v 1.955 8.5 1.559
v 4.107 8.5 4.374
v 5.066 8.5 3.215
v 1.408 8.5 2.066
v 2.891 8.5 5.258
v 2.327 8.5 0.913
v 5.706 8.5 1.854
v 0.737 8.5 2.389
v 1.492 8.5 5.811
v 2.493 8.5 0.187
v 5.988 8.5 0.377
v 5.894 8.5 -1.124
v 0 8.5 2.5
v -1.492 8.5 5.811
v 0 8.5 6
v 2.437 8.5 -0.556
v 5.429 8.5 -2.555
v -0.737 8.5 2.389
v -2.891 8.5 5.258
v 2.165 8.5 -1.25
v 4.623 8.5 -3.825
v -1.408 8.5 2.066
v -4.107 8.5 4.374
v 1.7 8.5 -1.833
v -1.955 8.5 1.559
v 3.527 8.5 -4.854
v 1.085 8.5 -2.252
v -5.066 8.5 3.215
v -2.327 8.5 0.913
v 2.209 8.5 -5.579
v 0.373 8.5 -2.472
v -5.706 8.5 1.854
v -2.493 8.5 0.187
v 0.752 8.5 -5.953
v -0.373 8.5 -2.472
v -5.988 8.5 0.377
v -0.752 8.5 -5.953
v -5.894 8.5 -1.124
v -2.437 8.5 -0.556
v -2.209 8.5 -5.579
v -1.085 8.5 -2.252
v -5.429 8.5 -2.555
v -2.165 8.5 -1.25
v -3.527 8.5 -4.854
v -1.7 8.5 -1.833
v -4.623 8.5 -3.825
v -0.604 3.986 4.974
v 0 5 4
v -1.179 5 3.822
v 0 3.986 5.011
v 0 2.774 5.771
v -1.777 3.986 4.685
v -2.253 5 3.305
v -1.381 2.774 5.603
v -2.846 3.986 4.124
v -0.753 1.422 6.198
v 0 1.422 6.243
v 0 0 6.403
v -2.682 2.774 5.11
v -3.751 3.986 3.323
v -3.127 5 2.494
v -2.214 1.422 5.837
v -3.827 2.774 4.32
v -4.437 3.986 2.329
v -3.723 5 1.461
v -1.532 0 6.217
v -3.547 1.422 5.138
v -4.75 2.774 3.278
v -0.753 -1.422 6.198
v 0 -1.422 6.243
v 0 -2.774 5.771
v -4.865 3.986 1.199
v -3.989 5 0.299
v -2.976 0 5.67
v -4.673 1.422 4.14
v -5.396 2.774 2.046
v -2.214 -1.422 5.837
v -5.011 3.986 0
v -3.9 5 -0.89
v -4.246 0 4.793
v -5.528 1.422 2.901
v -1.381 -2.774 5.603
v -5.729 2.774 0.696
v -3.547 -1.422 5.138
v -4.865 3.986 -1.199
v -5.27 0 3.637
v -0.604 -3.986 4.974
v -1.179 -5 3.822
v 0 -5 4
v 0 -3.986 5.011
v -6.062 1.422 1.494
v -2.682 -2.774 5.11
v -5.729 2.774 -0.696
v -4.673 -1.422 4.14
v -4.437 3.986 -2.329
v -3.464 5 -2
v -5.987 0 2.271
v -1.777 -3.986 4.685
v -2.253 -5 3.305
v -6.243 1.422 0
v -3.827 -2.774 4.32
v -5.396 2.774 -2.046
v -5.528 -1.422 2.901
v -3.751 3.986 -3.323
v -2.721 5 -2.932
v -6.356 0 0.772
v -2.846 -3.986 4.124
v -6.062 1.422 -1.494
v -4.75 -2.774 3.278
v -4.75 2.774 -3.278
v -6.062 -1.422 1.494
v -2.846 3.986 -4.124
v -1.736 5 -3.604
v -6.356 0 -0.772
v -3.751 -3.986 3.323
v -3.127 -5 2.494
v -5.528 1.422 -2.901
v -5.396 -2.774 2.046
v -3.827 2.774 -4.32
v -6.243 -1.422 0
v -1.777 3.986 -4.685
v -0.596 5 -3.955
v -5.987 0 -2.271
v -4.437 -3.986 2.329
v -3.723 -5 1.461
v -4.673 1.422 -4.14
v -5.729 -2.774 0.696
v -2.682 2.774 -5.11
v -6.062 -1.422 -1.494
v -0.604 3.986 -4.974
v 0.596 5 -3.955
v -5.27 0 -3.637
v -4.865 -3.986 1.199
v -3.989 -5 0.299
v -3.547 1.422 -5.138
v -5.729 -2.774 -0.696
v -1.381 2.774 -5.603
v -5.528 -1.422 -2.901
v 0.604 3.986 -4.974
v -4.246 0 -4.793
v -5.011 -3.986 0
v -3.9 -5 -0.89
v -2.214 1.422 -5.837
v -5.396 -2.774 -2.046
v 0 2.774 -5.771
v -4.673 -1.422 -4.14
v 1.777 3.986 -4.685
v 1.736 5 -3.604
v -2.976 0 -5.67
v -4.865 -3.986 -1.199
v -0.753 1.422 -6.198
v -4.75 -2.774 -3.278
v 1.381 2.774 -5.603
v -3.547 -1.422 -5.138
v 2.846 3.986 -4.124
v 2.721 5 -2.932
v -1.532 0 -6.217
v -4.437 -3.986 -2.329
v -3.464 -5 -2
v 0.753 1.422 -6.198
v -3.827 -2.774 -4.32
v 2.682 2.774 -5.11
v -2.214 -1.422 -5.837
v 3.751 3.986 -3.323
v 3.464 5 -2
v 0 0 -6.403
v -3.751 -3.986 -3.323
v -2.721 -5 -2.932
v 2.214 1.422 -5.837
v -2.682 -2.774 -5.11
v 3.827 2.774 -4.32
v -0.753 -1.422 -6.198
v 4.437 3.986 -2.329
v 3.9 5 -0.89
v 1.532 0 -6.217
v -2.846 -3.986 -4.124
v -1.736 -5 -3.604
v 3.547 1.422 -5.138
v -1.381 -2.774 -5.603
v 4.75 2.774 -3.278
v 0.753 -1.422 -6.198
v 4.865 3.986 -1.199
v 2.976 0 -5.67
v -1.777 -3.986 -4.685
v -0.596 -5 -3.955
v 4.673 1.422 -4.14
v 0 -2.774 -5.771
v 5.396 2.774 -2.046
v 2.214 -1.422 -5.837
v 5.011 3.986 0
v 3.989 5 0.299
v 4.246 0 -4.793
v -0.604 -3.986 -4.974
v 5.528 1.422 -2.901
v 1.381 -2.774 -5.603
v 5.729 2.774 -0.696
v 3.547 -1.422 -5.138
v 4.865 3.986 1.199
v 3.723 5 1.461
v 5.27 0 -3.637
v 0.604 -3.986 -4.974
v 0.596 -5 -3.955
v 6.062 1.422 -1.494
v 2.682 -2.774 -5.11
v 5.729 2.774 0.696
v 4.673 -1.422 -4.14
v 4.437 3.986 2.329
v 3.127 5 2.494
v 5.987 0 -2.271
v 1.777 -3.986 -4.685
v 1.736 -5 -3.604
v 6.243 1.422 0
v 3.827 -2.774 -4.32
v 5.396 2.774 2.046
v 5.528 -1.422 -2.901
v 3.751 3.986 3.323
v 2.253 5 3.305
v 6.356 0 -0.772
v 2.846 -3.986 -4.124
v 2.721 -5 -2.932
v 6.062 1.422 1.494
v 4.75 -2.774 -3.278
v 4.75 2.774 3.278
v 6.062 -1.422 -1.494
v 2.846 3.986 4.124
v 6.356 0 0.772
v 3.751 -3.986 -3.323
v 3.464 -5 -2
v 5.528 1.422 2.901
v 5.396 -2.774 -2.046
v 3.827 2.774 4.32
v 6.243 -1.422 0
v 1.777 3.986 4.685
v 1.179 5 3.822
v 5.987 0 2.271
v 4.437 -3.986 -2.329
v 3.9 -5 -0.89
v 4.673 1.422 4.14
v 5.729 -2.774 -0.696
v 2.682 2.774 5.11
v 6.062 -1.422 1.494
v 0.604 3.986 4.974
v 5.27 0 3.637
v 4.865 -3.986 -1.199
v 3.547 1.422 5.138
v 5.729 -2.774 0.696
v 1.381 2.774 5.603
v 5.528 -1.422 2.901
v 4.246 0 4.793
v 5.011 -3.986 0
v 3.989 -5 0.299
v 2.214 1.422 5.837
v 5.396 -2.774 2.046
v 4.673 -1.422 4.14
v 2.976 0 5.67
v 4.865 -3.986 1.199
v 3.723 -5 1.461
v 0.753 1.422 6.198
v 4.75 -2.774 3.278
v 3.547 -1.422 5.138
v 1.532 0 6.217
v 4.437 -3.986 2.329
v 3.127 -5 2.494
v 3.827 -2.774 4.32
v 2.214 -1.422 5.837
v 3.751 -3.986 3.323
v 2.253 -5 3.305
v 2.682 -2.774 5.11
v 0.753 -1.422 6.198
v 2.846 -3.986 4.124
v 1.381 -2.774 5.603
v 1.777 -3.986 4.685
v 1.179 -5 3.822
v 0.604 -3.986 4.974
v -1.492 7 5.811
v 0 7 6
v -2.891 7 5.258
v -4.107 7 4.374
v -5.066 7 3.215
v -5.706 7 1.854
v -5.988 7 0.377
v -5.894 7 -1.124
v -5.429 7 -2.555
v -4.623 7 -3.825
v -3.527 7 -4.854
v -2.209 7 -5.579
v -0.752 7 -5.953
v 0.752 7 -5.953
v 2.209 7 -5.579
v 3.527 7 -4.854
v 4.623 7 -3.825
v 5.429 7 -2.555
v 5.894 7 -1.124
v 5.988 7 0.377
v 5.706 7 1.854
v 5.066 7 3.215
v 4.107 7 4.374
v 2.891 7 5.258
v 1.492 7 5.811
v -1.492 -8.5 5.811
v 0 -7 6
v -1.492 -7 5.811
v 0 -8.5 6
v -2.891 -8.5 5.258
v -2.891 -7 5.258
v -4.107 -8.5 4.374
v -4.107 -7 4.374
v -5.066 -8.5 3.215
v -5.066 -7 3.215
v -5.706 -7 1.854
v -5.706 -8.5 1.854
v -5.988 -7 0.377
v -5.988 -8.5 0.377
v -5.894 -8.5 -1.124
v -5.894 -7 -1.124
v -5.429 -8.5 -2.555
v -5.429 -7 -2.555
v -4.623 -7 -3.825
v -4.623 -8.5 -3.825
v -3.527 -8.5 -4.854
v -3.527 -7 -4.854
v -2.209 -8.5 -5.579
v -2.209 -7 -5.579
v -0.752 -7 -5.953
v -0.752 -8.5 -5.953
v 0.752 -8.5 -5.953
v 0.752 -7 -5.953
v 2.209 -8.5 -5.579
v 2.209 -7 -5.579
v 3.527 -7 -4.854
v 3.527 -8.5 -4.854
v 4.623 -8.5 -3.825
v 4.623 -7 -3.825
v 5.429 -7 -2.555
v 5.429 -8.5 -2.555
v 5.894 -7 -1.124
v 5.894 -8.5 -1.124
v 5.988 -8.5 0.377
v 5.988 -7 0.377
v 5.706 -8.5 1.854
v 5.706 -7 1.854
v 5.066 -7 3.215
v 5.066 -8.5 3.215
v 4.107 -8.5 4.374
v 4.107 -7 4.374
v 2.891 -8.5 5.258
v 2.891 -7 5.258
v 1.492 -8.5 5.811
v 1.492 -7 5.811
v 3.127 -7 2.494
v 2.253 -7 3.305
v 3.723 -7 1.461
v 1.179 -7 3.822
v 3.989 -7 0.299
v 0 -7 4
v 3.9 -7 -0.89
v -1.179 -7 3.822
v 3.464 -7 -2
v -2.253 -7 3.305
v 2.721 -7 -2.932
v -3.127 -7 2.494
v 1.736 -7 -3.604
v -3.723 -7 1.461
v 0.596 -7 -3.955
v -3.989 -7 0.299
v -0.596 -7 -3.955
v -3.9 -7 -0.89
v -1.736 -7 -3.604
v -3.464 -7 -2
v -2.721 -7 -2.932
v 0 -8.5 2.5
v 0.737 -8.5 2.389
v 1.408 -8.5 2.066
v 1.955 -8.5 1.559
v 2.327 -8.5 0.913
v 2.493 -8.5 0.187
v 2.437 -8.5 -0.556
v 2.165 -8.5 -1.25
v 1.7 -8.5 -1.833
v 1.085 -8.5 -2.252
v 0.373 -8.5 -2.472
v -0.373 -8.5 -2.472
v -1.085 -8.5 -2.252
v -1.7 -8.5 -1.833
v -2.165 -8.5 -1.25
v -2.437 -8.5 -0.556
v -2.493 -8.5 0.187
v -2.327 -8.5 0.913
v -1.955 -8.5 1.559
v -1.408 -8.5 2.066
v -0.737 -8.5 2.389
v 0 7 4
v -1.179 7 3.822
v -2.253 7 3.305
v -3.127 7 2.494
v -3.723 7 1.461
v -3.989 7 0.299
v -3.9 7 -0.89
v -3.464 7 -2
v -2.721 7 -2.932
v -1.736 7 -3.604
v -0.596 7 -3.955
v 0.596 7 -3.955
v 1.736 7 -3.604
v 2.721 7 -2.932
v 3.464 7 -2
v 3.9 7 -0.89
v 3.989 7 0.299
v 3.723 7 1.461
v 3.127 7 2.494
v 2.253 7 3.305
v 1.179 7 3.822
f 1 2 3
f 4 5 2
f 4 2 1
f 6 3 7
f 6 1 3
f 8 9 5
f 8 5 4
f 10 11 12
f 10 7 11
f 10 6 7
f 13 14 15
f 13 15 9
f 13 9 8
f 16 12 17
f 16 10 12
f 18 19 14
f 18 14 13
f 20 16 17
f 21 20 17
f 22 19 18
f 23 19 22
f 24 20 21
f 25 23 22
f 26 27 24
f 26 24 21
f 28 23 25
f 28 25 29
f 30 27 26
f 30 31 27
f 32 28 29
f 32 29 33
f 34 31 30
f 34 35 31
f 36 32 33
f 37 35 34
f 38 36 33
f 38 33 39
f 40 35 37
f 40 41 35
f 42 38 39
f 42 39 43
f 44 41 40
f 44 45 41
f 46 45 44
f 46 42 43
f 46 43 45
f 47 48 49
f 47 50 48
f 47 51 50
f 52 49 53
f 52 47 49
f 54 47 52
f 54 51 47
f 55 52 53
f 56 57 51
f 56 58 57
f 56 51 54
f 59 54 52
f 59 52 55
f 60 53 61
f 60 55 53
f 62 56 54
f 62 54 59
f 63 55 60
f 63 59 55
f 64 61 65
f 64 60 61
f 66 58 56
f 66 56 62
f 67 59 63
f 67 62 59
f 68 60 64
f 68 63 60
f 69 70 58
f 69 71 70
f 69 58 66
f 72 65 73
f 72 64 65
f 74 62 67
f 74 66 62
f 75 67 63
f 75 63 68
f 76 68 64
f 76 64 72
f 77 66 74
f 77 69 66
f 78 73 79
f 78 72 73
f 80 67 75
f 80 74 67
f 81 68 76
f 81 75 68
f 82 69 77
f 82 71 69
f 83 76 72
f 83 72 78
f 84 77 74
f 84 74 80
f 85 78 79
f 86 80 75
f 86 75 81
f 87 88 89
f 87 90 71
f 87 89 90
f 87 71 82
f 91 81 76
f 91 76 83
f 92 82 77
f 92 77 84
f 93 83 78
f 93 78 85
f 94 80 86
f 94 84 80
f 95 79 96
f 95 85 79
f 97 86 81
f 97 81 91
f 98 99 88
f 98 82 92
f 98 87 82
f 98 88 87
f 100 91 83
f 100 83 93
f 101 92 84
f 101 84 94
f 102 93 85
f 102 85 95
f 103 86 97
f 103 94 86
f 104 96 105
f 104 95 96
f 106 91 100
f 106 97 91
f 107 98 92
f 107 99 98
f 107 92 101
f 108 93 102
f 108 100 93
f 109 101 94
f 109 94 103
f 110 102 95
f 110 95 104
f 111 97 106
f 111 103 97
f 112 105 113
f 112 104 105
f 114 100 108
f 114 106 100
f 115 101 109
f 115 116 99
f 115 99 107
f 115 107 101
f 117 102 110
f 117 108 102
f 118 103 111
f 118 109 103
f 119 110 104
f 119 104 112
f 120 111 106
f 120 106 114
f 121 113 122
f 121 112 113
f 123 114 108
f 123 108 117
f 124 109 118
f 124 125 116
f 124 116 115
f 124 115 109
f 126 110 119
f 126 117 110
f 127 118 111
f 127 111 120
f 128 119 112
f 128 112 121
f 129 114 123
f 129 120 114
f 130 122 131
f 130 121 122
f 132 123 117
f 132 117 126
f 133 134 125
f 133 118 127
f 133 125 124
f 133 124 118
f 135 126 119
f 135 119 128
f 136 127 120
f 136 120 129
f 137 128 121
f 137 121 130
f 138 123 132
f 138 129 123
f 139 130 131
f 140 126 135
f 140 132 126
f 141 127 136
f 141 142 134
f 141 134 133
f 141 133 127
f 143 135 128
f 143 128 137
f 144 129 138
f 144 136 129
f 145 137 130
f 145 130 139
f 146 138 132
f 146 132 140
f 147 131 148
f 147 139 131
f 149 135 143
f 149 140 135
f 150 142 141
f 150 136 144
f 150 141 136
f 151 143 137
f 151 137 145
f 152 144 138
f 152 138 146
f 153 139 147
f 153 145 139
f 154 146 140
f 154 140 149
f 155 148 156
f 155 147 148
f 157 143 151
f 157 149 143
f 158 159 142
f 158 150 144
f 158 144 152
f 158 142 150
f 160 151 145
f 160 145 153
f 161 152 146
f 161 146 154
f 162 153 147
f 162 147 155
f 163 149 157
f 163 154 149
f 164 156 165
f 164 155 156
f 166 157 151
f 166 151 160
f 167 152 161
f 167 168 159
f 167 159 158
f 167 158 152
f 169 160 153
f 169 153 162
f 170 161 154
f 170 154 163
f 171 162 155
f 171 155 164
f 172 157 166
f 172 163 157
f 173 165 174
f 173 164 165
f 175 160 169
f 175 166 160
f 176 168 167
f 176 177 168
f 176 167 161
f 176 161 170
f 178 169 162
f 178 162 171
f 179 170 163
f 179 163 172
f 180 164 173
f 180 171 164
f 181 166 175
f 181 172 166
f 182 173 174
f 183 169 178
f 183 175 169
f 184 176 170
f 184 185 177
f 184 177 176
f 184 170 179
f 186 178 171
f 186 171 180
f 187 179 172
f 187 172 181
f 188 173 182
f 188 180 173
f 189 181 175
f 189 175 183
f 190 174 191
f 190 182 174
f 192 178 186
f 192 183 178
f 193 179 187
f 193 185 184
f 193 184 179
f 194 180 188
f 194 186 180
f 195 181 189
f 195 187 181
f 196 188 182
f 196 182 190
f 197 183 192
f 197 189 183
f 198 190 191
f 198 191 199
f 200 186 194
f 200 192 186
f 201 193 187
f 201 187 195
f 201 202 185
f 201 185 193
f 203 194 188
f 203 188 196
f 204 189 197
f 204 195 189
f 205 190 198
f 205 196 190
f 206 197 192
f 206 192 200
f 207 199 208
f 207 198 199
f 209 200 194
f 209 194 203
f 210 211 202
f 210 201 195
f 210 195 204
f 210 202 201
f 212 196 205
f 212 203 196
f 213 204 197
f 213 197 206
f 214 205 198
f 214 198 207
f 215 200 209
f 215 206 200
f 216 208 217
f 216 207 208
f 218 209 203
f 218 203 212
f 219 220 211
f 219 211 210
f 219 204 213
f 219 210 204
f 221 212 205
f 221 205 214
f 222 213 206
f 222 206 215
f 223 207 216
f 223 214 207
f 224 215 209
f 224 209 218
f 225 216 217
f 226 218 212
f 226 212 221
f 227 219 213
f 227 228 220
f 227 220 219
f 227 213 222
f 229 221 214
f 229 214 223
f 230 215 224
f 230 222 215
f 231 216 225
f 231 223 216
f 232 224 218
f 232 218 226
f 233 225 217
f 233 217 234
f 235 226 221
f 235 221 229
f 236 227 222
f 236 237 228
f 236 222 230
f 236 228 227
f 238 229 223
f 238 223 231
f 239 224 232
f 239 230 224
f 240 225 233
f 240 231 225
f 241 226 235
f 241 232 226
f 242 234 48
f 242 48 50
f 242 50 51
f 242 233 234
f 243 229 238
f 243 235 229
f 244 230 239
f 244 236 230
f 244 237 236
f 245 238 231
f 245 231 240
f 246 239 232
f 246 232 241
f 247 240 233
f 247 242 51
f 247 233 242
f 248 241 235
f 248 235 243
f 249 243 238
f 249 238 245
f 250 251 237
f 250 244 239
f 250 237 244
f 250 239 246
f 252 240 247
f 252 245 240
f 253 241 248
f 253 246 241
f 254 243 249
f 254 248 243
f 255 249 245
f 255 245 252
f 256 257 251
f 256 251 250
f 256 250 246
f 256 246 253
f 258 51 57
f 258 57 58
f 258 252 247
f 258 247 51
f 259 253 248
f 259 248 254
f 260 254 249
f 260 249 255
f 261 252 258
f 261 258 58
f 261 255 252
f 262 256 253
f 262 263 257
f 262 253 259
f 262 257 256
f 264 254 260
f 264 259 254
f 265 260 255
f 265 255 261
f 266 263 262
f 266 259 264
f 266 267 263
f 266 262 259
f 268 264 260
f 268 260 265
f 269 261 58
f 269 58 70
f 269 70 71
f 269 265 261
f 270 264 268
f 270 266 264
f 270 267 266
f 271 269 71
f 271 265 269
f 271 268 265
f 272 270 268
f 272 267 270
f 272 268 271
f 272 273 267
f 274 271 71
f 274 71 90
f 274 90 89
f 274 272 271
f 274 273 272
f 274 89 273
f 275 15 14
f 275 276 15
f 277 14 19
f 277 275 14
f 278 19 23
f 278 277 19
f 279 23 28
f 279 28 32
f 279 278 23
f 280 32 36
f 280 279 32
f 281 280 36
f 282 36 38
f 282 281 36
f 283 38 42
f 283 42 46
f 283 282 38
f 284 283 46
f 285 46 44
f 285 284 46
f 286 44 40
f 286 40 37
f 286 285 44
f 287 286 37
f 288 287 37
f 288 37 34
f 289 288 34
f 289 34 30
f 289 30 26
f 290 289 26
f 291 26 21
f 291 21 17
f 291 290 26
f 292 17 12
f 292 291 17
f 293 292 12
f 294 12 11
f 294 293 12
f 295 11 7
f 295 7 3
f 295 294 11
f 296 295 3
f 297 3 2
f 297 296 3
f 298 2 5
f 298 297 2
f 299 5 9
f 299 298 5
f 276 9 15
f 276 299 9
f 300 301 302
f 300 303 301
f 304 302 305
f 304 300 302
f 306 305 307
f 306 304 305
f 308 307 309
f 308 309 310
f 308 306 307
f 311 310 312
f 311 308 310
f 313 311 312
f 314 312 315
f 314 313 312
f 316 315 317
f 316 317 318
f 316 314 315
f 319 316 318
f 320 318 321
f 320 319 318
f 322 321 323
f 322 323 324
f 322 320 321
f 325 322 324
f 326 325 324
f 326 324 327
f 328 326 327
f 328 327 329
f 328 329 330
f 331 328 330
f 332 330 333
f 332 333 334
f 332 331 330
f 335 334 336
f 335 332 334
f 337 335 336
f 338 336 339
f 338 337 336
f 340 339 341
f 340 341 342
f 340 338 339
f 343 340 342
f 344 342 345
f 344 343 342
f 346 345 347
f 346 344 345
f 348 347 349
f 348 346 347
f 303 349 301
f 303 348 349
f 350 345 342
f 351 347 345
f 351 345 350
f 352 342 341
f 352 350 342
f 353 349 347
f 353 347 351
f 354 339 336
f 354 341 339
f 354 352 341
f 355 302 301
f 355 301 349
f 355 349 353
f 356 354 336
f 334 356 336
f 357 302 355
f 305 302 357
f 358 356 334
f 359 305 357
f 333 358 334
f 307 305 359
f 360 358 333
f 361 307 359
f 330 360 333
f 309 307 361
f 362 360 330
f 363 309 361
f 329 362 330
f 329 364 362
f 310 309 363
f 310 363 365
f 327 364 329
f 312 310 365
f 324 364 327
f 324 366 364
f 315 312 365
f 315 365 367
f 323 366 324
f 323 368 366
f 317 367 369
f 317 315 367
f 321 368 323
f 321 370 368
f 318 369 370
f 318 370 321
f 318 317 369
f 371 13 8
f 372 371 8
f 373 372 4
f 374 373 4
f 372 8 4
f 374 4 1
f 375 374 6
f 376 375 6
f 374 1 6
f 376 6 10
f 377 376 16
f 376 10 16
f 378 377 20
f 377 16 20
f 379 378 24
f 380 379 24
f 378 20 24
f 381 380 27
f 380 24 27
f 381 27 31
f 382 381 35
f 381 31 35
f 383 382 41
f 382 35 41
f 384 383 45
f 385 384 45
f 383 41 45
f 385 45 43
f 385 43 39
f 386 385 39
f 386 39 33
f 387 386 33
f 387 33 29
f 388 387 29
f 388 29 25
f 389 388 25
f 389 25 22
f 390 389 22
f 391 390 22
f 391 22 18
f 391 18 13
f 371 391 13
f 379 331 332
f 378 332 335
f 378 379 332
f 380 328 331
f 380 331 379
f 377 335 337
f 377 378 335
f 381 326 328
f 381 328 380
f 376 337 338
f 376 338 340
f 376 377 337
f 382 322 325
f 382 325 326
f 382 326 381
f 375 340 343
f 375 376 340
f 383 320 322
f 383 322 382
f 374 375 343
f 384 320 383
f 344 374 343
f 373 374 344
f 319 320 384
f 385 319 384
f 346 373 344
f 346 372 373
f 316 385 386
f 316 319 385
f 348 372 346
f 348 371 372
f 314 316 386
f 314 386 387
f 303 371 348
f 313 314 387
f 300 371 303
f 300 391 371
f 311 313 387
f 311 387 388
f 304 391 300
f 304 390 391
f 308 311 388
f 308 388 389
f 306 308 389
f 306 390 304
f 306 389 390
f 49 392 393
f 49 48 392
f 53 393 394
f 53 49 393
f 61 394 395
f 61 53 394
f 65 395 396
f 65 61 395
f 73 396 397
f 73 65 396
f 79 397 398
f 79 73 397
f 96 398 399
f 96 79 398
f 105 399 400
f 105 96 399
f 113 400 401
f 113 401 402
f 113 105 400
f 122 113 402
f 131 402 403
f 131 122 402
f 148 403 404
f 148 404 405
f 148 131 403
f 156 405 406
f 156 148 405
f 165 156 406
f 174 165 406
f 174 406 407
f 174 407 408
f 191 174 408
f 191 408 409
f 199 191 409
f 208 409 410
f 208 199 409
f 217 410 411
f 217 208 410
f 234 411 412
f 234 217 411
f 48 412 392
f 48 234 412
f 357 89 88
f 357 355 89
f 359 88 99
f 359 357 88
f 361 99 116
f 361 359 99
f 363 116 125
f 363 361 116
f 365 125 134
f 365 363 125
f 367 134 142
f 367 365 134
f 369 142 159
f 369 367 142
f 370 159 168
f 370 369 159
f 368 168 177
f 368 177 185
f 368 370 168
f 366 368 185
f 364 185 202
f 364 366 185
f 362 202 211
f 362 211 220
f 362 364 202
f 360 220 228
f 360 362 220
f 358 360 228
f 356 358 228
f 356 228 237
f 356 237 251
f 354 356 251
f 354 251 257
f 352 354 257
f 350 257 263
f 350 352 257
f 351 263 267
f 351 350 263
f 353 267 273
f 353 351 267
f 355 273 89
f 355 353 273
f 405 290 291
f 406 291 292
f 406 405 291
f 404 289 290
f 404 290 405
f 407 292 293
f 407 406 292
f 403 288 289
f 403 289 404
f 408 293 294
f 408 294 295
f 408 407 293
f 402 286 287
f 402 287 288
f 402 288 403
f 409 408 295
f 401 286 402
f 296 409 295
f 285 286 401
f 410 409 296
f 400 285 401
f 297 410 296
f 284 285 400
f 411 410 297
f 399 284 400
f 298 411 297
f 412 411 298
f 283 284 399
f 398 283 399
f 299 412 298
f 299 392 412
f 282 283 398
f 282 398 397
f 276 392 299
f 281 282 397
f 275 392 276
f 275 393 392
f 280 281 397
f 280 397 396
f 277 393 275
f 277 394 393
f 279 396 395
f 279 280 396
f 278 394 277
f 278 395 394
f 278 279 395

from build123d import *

# Parameters (mm, degrees)
SKETCH2_R          = 2.5
CUT_EXTRUDE1_DEPTH = 20.261360284


with BuildPart() as part:
    # Sketch1 → Revolve1 (revolve)
    with BuildSketch(Plane.XY, mode=Mode.PRIVATE) as revolve1_sk:
        with BuildLine():
            Line((-6, 7), (-4, 7))
            Line((-4, 7), (-4, 5))
            ThreePointArc((-4, 5), (-6.403124237, 0), (-4, -5))
            Line((-4, -5), (-4, -7))
            Line((-4, -7), (-6, -7))
            Line((-6, -7), (-6, -8.5))
            Line((-6, -8.5), (0, -8.5))
            Line((0, -8.5), (0, 8.5))
            Line((0, 8.5), (-6, 8.5))
            Line((-6, 8.5), (-6, 7))
        make_face()
    revolve(revolve1_sk.sketch.rotate(Axis((0, 16.114211291, 0), (0, -1, 0)), 270), axis=Axis((0, 16.114211291, 0), (0, -1, 0)))

    # Sketch2 → Cut-Extrude1 (cut, through all)
    with BuildSketch(Plane(origin=(0, 8.5, 0), x_dir=(1, 0, 0), z_dir=(0, 1, 0))):
        with Locations(Location((0, 0, 0), (0, 0, 270))):
            Circle(SKETCH2_R)
    extrude(amount=-CUT_EXTRUDE1_DEPTH, mode=Mode.SUBTRACT)


solid = part.part
